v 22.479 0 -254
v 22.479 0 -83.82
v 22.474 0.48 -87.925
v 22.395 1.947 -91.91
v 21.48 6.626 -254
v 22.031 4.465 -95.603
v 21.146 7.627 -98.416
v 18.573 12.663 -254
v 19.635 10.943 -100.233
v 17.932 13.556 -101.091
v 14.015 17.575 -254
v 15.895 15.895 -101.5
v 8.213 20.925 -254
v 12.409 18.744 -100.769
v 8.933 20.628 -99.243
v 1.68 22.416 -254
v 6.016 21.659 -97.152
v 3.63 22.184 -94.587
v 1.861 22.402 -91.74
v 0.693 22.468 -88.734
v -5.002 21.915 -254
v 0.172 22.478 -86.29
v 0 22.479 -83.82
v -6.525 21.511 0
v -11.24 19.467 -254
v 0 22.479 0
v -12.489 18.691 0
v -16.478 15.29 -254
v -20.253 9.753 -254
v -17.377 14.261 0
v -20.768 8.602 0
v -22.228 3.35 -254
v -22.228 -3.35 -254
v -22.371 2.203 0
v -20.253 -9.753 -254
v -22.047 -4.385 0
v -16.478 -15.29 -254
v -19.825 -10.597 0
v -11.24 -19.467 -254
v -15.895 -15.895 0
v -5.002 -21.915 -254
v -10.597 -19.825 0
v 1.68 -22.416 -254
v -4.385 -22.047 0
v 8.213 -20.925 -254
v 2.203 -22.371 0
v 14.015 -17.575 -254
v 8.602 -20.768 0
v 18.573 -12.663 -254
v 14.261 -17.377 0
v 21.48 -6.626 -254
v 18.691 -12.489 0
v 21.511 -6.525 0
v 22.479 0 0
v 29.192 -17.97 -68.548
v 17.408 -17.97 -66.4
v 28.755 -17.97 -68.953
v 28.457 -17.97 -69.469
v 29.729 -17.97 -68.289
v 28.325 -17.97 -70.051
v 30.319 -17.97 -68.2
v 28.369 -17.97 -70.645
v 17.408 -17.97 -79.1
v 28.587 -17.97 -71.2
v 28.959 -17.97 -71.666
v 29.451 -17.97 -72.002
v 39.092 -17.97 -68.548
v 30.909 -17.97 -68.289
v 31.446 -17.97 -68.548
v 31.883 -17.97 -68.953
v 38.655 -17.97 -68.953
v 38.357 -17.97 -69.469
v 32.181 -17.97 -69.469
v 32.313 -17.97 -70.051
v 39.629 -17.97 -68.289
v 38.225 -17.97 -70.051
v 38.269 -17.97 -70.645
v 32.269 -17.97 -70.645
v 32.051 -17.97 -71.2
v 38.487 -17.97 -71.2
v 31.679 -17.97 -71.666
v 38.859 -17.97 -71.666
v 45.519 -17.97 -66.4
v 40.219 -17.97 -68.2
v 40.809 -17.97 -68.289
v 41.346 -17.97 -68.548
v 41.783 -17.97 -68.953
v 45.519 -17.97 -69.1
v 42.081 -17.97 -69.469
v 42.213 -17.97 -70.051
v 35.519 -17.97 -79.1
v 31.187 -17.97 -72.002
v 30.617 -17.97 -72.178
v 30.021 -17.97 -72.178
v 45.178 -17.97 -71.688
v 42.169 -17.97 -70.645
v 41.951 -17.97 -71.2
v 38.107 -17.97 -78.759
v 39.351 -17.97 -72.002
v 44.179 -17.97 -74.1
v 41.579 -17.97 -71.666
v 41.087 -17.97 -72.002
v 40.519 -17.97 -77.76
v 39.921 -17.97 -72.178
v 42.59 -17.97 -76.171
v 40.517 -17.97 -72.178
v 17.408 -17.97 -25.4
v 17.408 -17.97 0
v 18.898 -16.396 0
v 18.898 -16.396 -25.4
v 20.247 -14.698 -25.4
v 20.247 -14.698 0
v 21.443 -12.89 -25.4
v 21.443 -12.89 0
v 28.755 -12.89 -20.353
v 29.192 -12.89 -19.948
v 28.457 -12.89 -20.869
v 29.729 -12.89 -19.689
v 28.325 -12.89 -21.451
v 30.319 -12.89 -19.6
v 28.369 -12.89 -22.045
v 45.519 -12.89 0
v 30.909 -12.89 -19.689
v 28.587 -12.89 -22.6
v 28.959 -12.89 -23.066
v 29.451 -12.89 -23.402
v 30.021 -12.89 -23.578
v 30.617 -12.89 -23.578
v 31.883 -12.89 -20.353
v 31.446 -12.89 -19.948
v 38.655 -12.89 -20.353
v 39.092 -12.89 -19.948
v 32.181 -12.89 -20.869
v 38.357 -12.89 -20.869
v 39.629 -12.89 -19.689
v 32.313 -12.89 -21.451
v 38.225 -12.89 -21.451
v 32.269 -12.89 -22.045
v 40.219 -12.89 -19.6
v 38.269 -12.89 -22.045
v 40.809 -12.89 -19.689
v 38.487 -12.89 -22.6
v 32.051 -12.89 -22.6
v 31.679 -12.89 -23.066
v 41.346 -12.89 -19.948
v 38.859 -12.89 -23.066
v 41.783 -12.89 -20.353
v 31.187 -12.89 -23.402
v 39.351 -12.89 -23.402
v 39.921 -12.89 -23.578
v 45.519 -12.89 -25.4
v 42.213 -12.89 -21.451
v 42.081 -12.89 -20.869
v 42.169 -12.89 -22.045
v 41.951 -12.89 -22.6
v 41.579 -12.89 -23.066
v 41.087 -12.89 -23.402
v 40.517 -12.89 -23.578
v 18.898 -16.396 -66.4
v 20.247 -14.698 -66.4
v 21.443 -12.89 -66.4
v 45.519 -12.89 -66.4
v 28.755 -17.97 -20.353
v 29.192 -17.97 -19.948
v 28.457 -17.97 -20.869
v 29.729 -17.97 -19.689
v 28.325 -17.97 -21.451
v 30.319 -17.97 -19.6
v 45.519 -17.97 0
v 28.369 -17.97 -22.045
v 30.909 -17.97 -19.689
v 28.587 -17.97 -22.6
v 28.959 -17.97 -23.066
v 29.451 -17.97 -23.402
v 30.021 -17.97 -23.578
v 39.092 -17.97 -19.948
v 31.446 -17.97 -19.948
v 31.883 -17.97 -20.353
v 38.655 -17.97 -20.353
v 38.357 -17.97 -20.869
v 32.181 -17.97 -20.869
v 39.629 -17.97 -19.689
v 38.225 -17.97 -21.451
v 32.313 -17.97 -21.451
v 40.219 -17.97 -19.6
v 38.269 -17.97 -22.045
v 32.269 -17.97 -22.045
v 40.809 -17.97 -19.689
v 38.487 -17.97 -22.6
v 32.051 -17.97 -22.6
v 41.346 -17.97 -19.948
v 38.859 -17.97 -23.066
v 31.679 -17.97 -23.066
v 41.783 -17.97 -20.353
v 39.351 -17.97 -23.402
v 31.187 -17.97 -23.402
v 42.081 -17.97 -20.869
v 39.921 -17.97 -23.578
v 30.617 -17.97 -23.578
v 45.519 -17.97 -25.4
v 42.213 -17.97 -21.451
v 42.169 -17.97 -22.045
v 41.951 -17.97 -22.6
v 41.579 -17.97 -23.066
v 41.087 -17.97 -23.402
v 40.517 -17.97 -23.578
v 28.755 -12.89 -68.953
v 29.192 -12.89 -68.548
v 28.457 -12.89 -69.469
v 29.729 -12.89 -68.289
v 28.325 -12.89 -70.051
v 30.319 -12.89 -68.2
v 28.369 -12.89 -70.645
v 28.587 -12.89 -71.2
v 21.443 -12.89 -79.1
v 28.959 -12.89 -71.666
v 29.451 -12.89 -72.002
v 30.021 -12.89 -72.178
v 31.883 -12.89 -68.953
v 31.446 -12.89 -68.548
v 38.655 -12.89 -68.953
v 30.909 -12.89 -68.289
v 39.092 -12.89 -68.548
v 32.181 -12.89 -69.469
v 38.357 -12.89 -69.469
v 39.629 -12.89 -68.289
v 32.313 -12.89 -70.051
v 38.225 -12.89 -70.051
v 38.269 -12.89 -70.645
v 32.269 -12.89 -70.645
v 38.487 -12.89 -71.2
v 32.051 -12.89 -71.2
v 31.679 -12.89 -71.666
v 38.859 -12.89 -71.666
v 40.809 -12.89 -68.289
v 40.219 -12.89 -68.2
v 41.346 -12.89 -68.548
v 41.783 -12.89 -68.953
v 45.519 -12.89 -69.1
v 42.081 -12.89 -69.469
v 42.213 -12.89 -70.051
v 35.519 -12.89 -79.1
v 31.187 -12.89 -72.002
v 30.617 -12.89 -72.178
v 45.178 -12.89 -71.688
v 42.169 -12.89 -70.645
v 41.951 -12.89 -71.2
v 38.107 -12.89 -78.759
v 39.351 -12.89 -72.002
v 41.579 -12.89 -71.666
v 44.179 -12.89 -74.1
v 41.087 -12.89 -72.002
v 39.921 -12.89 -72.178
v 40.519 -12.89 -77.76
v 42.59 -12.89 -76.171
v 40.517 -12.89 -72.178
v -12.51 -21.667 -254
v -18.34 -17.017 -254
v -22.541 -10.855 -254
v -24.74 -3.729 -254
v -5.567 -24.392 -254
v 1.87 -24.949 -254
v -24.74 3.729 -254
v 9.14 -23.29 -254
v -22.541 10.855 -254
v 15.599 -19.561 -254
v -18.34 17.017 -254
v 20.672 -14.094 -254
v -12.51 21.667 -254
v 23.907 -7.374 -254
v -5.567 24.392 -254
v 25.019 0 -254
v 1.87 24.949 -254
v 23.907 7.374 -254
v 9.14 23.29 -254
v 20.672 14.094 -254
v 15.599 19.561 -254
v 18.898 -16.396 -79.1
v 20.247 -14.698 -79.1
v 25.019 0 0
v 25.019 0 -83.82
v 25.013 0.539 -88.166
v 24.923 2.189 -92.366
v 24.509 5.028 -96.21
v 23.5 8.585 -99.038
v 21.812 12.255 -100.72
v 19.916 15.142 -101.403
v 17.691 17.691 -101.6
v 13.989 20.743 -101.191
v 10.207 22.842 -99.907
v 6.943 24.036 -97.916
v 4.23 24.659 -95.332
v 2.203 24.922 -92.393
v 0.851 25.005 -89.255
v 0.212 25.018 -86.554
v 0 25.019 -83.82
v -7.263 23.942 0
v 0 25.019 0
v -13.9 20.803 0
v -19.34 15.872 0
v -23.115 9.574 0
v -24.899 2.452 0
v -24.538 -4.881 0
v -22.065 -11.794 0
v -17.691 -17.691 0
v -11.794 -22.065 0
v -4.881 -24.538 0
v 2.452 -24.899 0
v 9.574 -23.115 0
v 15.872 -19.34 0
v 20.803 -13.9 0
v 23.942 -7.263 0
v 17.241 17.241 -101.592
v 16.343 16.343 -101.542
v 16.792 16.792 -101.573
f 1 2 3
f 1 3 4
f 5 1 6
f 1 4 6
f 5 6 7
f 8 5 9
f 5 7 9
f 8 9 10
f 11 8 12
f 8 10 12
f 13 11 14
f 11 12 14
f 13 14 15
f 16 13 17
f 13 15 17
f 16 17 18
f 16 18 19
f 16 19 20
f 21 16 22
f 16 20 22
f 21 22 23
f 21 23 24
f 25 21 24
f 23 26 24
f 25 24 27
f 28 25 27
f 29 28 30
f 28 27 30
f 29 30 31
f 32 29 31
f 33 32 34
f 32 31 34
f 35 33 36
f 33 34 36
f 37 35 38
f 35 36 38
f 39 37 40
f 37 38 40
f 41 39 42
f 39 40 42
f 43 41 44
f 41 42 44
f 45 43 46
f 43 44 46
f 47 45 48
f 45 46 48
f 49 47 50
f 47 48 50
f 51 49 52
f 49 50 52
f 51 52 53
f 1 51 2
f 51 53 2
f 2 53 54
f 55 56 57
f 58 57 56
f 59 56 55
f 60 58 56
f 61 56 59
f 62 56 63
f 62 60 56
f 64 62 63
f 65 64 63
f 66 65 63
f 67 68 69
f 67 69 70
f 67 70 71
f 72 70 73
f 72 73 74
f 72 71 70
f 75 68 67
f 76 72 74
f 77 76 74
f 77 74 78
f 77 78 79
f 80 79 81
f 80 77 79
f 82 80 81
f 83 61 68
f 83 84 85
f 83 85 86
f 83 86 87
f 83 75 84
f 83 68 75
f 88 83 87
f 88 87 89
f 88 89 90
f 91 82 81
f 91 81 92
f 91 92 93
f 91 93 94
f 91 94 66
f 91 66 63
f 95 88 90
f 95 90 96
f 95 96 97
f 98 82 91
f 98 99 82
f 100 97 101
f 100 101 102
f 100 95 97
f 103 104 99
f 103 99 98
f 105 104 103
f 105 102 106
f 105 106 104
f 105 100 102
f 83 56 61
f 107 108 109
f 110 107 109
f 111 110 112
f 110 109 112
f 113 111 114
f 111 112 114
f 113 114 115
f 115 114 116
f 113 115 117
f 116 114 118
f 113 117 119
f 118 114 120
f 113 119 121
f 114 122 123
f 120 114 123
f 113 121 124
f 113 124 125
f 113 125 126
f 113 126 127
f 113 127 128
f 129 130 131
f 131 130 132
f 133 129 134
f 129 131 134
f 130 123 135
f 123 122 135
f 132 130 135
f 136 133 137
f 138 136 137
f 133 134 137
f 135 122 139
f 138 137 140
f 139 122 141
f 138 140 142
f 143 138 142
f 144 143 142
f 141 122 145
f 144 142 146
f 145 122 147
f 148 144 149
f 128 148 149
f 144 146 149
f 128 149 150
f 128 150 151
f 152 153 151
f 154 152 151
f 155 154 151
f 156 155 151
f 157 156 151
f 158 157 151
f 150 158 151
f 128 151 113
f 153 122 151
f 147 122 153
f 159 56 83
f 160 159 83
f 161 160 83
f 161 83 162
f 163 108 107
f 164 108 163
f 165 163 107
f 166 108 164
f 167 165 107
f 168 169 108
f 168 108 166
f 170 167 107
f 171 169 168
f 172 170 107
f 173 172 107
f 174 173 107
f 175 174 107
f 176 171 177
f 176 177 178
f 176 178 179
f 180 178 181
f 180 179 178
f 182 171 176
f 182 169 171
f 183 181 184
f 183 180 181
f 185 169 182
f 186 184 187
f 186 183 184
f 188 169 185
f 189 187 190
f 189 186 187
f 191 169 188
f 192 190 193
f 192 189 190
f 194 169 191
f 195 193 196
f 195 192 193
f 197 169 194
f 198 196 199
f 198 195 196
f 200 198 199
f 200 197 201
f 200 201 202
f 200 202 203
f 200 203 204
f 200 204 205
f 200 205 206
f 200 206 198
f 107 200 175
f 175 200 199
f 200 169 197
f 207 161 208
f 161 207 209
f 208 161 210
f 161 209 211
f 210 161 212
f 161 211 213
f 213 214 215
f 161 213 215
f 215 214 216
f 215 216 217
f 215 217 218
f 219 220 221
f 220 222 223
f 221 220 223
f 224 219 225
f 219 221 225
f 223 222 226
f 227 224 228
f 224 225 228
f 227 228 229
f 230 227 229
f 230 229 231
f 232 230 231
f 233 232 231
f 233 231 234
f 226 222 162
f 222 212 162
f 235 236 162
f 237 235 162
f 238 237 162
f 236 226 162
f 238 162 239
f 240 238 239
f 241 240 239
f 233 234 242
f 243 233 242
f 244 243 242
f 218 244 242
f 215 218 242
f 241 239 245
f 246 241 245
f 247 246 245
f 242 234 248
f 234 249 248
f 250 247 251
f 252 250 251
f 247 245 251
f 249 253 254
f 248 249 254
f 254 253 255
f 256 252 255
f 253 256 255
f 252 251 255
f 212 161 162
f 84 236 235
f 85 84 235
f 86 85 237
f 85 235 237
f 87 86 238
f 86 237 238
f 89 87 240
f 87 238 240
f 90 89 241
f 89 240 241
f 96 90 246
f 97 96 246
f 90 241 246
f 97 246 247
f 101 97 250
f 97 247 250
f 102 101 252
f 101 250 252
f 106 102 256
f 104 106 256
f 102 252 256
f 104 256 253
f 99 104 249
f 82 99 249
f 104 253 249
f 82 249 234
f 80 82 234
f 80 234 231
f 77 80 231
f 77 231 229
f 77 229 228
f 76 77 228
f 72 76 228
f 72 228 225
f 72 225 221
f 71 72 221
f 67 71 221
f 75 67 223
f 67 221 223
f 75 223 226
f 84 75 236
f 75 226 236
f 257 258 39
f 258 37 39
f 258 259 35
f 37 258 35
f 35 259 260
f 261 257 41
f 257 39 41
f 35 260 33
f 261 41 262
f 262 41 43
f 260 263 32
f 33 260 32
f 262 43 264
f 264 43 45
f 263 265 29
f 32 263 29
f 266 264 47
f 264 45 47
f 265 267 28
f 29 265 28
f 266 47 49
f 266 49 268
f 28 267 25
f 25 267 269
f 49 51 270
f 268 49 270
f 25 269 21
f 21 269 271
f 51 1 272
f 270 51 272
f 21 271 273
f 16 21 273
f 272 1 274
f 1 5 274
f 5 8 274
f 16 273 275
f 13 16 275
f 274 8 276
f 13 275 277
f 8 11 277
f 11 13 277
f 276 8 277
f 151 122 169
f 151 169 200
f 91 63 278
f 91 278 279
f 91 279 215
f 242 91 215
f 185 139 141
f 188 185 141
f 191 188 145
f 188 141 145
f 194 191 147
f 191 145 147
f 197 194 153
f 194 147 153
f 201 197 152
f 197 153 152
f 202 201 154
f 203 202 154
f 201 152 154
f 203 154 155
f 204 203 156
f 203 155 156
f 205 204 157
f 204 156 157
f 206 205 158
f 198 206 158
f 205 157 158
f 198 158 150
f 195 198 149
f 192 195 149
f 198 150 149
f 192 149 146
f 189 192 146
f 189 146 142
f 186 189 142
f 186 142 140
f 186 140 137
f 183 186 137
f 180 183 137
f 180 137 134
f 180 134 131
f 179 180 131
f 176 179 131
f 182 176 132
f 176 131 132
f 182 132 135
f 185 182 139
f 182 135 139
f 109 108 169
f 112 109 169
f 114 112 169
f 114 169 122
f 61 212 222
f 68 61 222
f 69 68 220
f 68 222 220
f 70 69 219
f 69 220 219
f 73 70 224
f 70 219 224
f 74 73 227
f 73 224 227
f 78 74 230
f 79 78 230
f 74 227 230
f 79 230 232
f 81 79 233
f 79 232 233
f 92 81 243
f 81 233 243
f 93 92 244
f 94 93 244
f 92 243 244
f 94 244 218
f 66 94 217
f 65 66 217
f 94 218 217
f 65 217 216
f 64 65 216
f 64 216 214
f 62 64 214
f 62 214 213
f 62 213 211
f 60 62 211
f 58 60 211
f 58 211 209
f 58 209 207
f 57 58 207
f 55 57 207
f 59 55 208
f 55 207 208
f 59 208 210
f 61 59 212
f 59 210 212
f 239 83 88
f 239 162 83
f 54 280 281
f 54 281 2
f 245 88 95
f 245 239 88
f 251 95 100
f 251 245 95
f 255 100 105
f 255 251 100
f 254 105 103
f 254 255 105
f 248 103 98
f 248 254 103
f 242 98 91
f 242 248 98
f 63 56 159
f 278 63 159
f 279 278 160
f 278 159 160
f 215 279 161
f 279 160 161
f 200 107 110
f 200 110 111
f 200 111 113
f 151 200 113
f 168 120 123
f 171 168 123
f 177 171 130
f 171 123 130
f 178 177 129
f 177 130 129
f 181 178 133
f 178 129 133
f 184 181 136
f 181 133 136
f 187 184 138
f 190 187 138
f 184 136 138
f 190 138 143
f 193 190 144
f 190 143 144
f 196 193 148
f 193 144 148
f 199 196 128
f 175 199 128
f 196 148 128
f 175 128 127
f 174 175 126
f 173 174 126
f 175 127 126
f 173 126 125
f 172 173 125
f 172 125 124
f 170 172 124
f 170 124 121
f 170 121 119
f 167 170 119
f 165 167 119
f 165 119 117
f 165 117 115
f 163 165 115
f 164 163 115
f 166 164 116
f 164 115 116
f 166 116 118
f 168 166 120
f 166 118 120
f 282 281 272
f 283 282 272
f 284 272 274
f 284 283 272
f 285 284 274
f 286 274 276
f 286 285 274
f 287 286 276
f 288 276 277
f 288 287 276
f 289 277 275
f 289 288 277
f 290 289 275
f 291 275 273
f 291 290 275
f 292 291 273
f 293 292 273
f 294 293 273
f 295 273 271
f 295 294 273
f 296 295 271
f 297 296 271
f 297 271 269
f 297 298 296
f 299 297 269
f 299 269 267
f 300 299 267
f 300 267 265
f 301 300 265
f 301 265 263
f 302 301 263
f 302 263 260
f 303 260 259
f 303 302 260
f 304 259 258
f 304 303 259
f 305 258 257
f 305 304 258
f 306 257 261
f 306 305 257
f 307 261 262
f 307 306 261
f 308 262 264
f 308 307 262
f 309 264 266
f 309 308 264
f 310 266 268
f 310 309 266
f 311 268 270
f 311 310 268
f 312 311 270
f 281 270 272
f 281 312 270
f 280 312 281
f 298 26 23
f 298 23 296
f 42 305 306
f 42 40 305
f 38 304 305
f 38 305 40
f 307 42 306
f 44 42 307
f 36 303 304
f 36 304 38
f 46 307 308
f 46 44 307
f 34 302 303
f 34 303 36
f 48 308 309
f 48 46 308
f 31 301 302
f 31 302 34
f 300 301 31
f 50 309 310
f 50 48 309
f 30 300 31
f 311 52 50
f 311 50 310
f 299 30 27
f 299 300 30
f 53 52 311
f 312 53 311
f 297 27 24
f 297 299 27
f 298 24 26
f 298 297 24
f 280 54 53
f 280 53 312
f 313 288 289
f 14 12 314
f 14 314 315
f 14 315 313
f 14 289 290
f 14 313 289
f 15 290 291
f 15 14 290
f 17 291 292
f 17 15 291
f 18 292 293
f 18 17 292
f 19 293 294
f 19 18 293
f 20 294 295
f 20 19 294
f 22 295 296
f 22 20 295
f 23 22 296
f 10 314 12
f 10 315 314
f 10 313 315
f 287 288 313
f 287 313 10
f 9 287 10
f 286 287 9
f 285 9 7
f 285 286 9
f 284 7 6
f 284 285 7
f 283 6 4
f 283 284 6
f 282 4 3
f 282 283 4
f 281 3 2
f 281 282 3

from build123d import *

# Parameters (mm, degrees)
SKETCH1_R                            = 25.019
SKETCH1_R_2                          = 22.479
BOSS_EXTRUDE1_DEPTH                  = 254
CUT_EXTRUDE1_DEPTH                   = 101.6
SKETCH3_W                            = 25.4
SKETCH3_H                            = 5.08
SKETCH3_W_2                          = 12.7
BOSS_EXTRUDE2_DEPTH                  = 20.5
BOSS_EXTRUDE2_DIRECTION_2_REACH      = 262.088
BOSS_EXTRUDE2_DIRECTION_2_END_RADIUS = 25.019
FILLET3_R                            = 17.78
SKETCH4_R                            = 2
CUT_EXTRUDE2_DEPTH                   = 5.08
FILLET4_R                            = 10


with BuildPart() as part:
    # Sketch1 → Boss-Extrude1 (new body)
    with BuildSketch(Plane.XY):
        Circle(SKETCH1_R)
        Circle(SKETCH1_R_2, mode=Mode.SUBTRACT)
    extrude(amount=-BOSS_EXTRUDE1_DEPTH)

    # Sketch2 → Cut-Extrude1 (cut)
    with BuildSketch(Plane.XY):
        with BuildLine():
            Line((0, 22.479), (0, 25.019))
            ThreePointArc((0, 25.019), (17.691104559, 17.691104559), (25.019, 0))
            Line((25.019, 0), (22.479, 0))
            ThreePointArc((22.479, 0), (15.895053334, 15.895053334), (0, 22.479))
        make_face()
    extrude(amount=-CUT_EXTRUDE1_DEPTH, mode=Mode.SUBTRACT)

    # Fillet3
    # the kernel refuses this fillet: 17.78 mm, written as the material it adds along each edge
    with BuildSketch(Plane(origin=(69.469, 0, -101.6), x_dir=(0, 0, 1), z_dir=(-1, 0, 0))) as fillet3_piece_1_section:
        with BuildLine():
            CenterArc((FILLET3_R, FILLET3_R), FILLET3_R, 180, 90)
            Line((0, FILLET3_R), (0, 0))
            Line((0, 0), (FILLET3_R, 0))
        make_face()
    fillet3_piece_1 = extrude(amount=91.44, mode=Mode.PRIVATE)
    fillet3_piece_1 = fillet3_piece_1 & Plane(origin=(0, 0, -97.674052769), x_dir=(1, 0, 0), z_dir=(0, 0, 1)) * Cylinder(25.019, 254, mode=Mode.PRIVATE)
    fillet3_piece_1 = fillet3_piece_1 - Plane(origin=(0, 0, -97.674052769), x_dir=(1, 0, 0), z_dir=(0, 0, 1)) * Cylinder(22.479, 254, mode=Mode.PRIVATE)
    add(fillet3_piece_1)
    with BuildSketch(Plane(origin=(0, -21.971, -101.6), x_dir=(1, 0, 0), z_dir=(0, 1, 0))) as fillet3_piece_2_section:
        with BuildLine():
            CenterArc((FILLET3_R, -FILLET3_R), FILLET3_R, 90, 90)
            Line((0, -FILLET3_R), (0, 0))
            Line((0, 0), (FILLET3_R, 0))
        make_face()
    fillet3_piece_2 = extrude(amount=91.44, mode=Mode.PRIVATE)
    fillet3_piece_2 = fillet3_piece_2 & Plane(origin=(0, 0, -100.962112939), x_dir=(1, 0, 0), z_dir=(0, 0, 1)) * Cylinder(25.019, 254, mode=Mode.PRIVATE)
    fillet3_piece_2 = fillet3_piece_2 - Plane(origin=(0, 0, -100.962112939), x_dir=(1, 0, 0), z_dir=(0, 0, 1)) * Cylinder(22.479, 254, mode=Mode.PRIVATE)
    add(fillet3_piece_2)


with BuildPart() as body_2:
    # Sketch3 → Boss-Extrude2 (new body)
    with BuildSketch(Plane(origin=(25.019, 0, 0), x_dir=(0, 0, -1), z_dir=(1, 0, 0))):
        with Locations((12.7, -15.43)):
            Rectangle(SKETCH3_W, SKETCH3_H)
        with Locations((72.75, -15.43)):
            Rectangle(SKETCH3_W_2, SKETCH3_H)
    extrude(amount=BOSS_EXTRUDE2_DEPTH)

    # Boss-Extrude2 direction 2: up to this cylinder (the profile starts outside it)
    boss_extrude2_direction_2_end = Plane(origin=(0, 0, -42.725), z_dir=(0, 0, 1)) * Cylinder(BOSS_EXTRUDE2_DIRECTION_2_END_RADIUS, 635.264, mode=Mode.PRIVATE)
    # Sketch3 → Boss-Extrude2 direction 2 (add, up to the surface)
    with BuildSketch(Plane(origin=(25.019, 0, 0), x_dir=(0, 0, -1), z_dir=(1, 0, 0)), mode=Mode.PRIVATE) as boss_extrude2_direction_2_sk1:
        with Locations((12.7, -15.43)):
            Rectangle(SKETCH3_W, SKETCH3_H)
    boss_extrude2_direction_2_tool1 = extrude(boss_extrude2_direction_2_sk1.sketch, amount=-BOSS_EXTRUDE2_DIRECTION_2_REACH, mode=Mode.PRIVATE) - boss_extrude2_direction_2_end
    add(boss_extrude2_direction_2_tool1.solids().sort_by_distance((25.019, -15.43, -12.7))[0])
    # Sketch3 → Boss-Extrude2 direction 2 (add, up to the surface)
    with BuildSketch(Plane(origin=(25.019, 0, 0), x_dir=(0, 0, -1), z_dir=(1, 0, 0)), mode=Mode.PRIVATE) as boss_extrude2_direction_2_sk2:
        with Locations((72.75, -15.43)):
            Rectangle(SKETCH3_W_2, SKETCH3_H)
    boss_extrude2_direction_2_tool2 = extrude(boss_extrude2_direction_2_sk2.sketch, amount=-BOSS_EXTRUDE2_DIRECTION_2_REACH, mode=Mode.PRIVATE) - boss_extrude2_direction_2_end
    add(boss_extrude2_direction_2_tool2.solids().sort_by_distance((25.019, -15.43, -72.75))[0])

    # Sketch4 → Cut-Extrude2 (cut)
    with BuildSketch(Plane(origin=(0, -12.89, 0), x_dir=(1, 0, 0), z_dir=(0, 1, 0))):
        with Locations(Location((30.319, 70.2, 0), (0, 0, 270))):
            Circle(SKETCH4_R)
        with Locations(Location((40.219, 70.2, 0), (0, 0, 270))):
            Circle(SKETCH4_R)
        with Locations(Location((30.319, 21.6, 0), (0, 0, 270))):
            Circle(SKETCH4_R)
        with Locations(Location((40.219, 21.6, 0), (0, 0, 270))):
            Circle(SKETCH4_R)
    extrude(amount=-CUT_EXTRUDE2_DEPTH, mode=Mode.SUBTRACT)

    # Fillet4
    fillet4_edges = [body_2.edges().sort_by_distance(p)[0] for p in [
        (45.519, -15.43, -79.1),
    ]]
    fillet(fillet4_edges, radius=FILLET4_R)


solid = Compound([part.part, body_2.part])
